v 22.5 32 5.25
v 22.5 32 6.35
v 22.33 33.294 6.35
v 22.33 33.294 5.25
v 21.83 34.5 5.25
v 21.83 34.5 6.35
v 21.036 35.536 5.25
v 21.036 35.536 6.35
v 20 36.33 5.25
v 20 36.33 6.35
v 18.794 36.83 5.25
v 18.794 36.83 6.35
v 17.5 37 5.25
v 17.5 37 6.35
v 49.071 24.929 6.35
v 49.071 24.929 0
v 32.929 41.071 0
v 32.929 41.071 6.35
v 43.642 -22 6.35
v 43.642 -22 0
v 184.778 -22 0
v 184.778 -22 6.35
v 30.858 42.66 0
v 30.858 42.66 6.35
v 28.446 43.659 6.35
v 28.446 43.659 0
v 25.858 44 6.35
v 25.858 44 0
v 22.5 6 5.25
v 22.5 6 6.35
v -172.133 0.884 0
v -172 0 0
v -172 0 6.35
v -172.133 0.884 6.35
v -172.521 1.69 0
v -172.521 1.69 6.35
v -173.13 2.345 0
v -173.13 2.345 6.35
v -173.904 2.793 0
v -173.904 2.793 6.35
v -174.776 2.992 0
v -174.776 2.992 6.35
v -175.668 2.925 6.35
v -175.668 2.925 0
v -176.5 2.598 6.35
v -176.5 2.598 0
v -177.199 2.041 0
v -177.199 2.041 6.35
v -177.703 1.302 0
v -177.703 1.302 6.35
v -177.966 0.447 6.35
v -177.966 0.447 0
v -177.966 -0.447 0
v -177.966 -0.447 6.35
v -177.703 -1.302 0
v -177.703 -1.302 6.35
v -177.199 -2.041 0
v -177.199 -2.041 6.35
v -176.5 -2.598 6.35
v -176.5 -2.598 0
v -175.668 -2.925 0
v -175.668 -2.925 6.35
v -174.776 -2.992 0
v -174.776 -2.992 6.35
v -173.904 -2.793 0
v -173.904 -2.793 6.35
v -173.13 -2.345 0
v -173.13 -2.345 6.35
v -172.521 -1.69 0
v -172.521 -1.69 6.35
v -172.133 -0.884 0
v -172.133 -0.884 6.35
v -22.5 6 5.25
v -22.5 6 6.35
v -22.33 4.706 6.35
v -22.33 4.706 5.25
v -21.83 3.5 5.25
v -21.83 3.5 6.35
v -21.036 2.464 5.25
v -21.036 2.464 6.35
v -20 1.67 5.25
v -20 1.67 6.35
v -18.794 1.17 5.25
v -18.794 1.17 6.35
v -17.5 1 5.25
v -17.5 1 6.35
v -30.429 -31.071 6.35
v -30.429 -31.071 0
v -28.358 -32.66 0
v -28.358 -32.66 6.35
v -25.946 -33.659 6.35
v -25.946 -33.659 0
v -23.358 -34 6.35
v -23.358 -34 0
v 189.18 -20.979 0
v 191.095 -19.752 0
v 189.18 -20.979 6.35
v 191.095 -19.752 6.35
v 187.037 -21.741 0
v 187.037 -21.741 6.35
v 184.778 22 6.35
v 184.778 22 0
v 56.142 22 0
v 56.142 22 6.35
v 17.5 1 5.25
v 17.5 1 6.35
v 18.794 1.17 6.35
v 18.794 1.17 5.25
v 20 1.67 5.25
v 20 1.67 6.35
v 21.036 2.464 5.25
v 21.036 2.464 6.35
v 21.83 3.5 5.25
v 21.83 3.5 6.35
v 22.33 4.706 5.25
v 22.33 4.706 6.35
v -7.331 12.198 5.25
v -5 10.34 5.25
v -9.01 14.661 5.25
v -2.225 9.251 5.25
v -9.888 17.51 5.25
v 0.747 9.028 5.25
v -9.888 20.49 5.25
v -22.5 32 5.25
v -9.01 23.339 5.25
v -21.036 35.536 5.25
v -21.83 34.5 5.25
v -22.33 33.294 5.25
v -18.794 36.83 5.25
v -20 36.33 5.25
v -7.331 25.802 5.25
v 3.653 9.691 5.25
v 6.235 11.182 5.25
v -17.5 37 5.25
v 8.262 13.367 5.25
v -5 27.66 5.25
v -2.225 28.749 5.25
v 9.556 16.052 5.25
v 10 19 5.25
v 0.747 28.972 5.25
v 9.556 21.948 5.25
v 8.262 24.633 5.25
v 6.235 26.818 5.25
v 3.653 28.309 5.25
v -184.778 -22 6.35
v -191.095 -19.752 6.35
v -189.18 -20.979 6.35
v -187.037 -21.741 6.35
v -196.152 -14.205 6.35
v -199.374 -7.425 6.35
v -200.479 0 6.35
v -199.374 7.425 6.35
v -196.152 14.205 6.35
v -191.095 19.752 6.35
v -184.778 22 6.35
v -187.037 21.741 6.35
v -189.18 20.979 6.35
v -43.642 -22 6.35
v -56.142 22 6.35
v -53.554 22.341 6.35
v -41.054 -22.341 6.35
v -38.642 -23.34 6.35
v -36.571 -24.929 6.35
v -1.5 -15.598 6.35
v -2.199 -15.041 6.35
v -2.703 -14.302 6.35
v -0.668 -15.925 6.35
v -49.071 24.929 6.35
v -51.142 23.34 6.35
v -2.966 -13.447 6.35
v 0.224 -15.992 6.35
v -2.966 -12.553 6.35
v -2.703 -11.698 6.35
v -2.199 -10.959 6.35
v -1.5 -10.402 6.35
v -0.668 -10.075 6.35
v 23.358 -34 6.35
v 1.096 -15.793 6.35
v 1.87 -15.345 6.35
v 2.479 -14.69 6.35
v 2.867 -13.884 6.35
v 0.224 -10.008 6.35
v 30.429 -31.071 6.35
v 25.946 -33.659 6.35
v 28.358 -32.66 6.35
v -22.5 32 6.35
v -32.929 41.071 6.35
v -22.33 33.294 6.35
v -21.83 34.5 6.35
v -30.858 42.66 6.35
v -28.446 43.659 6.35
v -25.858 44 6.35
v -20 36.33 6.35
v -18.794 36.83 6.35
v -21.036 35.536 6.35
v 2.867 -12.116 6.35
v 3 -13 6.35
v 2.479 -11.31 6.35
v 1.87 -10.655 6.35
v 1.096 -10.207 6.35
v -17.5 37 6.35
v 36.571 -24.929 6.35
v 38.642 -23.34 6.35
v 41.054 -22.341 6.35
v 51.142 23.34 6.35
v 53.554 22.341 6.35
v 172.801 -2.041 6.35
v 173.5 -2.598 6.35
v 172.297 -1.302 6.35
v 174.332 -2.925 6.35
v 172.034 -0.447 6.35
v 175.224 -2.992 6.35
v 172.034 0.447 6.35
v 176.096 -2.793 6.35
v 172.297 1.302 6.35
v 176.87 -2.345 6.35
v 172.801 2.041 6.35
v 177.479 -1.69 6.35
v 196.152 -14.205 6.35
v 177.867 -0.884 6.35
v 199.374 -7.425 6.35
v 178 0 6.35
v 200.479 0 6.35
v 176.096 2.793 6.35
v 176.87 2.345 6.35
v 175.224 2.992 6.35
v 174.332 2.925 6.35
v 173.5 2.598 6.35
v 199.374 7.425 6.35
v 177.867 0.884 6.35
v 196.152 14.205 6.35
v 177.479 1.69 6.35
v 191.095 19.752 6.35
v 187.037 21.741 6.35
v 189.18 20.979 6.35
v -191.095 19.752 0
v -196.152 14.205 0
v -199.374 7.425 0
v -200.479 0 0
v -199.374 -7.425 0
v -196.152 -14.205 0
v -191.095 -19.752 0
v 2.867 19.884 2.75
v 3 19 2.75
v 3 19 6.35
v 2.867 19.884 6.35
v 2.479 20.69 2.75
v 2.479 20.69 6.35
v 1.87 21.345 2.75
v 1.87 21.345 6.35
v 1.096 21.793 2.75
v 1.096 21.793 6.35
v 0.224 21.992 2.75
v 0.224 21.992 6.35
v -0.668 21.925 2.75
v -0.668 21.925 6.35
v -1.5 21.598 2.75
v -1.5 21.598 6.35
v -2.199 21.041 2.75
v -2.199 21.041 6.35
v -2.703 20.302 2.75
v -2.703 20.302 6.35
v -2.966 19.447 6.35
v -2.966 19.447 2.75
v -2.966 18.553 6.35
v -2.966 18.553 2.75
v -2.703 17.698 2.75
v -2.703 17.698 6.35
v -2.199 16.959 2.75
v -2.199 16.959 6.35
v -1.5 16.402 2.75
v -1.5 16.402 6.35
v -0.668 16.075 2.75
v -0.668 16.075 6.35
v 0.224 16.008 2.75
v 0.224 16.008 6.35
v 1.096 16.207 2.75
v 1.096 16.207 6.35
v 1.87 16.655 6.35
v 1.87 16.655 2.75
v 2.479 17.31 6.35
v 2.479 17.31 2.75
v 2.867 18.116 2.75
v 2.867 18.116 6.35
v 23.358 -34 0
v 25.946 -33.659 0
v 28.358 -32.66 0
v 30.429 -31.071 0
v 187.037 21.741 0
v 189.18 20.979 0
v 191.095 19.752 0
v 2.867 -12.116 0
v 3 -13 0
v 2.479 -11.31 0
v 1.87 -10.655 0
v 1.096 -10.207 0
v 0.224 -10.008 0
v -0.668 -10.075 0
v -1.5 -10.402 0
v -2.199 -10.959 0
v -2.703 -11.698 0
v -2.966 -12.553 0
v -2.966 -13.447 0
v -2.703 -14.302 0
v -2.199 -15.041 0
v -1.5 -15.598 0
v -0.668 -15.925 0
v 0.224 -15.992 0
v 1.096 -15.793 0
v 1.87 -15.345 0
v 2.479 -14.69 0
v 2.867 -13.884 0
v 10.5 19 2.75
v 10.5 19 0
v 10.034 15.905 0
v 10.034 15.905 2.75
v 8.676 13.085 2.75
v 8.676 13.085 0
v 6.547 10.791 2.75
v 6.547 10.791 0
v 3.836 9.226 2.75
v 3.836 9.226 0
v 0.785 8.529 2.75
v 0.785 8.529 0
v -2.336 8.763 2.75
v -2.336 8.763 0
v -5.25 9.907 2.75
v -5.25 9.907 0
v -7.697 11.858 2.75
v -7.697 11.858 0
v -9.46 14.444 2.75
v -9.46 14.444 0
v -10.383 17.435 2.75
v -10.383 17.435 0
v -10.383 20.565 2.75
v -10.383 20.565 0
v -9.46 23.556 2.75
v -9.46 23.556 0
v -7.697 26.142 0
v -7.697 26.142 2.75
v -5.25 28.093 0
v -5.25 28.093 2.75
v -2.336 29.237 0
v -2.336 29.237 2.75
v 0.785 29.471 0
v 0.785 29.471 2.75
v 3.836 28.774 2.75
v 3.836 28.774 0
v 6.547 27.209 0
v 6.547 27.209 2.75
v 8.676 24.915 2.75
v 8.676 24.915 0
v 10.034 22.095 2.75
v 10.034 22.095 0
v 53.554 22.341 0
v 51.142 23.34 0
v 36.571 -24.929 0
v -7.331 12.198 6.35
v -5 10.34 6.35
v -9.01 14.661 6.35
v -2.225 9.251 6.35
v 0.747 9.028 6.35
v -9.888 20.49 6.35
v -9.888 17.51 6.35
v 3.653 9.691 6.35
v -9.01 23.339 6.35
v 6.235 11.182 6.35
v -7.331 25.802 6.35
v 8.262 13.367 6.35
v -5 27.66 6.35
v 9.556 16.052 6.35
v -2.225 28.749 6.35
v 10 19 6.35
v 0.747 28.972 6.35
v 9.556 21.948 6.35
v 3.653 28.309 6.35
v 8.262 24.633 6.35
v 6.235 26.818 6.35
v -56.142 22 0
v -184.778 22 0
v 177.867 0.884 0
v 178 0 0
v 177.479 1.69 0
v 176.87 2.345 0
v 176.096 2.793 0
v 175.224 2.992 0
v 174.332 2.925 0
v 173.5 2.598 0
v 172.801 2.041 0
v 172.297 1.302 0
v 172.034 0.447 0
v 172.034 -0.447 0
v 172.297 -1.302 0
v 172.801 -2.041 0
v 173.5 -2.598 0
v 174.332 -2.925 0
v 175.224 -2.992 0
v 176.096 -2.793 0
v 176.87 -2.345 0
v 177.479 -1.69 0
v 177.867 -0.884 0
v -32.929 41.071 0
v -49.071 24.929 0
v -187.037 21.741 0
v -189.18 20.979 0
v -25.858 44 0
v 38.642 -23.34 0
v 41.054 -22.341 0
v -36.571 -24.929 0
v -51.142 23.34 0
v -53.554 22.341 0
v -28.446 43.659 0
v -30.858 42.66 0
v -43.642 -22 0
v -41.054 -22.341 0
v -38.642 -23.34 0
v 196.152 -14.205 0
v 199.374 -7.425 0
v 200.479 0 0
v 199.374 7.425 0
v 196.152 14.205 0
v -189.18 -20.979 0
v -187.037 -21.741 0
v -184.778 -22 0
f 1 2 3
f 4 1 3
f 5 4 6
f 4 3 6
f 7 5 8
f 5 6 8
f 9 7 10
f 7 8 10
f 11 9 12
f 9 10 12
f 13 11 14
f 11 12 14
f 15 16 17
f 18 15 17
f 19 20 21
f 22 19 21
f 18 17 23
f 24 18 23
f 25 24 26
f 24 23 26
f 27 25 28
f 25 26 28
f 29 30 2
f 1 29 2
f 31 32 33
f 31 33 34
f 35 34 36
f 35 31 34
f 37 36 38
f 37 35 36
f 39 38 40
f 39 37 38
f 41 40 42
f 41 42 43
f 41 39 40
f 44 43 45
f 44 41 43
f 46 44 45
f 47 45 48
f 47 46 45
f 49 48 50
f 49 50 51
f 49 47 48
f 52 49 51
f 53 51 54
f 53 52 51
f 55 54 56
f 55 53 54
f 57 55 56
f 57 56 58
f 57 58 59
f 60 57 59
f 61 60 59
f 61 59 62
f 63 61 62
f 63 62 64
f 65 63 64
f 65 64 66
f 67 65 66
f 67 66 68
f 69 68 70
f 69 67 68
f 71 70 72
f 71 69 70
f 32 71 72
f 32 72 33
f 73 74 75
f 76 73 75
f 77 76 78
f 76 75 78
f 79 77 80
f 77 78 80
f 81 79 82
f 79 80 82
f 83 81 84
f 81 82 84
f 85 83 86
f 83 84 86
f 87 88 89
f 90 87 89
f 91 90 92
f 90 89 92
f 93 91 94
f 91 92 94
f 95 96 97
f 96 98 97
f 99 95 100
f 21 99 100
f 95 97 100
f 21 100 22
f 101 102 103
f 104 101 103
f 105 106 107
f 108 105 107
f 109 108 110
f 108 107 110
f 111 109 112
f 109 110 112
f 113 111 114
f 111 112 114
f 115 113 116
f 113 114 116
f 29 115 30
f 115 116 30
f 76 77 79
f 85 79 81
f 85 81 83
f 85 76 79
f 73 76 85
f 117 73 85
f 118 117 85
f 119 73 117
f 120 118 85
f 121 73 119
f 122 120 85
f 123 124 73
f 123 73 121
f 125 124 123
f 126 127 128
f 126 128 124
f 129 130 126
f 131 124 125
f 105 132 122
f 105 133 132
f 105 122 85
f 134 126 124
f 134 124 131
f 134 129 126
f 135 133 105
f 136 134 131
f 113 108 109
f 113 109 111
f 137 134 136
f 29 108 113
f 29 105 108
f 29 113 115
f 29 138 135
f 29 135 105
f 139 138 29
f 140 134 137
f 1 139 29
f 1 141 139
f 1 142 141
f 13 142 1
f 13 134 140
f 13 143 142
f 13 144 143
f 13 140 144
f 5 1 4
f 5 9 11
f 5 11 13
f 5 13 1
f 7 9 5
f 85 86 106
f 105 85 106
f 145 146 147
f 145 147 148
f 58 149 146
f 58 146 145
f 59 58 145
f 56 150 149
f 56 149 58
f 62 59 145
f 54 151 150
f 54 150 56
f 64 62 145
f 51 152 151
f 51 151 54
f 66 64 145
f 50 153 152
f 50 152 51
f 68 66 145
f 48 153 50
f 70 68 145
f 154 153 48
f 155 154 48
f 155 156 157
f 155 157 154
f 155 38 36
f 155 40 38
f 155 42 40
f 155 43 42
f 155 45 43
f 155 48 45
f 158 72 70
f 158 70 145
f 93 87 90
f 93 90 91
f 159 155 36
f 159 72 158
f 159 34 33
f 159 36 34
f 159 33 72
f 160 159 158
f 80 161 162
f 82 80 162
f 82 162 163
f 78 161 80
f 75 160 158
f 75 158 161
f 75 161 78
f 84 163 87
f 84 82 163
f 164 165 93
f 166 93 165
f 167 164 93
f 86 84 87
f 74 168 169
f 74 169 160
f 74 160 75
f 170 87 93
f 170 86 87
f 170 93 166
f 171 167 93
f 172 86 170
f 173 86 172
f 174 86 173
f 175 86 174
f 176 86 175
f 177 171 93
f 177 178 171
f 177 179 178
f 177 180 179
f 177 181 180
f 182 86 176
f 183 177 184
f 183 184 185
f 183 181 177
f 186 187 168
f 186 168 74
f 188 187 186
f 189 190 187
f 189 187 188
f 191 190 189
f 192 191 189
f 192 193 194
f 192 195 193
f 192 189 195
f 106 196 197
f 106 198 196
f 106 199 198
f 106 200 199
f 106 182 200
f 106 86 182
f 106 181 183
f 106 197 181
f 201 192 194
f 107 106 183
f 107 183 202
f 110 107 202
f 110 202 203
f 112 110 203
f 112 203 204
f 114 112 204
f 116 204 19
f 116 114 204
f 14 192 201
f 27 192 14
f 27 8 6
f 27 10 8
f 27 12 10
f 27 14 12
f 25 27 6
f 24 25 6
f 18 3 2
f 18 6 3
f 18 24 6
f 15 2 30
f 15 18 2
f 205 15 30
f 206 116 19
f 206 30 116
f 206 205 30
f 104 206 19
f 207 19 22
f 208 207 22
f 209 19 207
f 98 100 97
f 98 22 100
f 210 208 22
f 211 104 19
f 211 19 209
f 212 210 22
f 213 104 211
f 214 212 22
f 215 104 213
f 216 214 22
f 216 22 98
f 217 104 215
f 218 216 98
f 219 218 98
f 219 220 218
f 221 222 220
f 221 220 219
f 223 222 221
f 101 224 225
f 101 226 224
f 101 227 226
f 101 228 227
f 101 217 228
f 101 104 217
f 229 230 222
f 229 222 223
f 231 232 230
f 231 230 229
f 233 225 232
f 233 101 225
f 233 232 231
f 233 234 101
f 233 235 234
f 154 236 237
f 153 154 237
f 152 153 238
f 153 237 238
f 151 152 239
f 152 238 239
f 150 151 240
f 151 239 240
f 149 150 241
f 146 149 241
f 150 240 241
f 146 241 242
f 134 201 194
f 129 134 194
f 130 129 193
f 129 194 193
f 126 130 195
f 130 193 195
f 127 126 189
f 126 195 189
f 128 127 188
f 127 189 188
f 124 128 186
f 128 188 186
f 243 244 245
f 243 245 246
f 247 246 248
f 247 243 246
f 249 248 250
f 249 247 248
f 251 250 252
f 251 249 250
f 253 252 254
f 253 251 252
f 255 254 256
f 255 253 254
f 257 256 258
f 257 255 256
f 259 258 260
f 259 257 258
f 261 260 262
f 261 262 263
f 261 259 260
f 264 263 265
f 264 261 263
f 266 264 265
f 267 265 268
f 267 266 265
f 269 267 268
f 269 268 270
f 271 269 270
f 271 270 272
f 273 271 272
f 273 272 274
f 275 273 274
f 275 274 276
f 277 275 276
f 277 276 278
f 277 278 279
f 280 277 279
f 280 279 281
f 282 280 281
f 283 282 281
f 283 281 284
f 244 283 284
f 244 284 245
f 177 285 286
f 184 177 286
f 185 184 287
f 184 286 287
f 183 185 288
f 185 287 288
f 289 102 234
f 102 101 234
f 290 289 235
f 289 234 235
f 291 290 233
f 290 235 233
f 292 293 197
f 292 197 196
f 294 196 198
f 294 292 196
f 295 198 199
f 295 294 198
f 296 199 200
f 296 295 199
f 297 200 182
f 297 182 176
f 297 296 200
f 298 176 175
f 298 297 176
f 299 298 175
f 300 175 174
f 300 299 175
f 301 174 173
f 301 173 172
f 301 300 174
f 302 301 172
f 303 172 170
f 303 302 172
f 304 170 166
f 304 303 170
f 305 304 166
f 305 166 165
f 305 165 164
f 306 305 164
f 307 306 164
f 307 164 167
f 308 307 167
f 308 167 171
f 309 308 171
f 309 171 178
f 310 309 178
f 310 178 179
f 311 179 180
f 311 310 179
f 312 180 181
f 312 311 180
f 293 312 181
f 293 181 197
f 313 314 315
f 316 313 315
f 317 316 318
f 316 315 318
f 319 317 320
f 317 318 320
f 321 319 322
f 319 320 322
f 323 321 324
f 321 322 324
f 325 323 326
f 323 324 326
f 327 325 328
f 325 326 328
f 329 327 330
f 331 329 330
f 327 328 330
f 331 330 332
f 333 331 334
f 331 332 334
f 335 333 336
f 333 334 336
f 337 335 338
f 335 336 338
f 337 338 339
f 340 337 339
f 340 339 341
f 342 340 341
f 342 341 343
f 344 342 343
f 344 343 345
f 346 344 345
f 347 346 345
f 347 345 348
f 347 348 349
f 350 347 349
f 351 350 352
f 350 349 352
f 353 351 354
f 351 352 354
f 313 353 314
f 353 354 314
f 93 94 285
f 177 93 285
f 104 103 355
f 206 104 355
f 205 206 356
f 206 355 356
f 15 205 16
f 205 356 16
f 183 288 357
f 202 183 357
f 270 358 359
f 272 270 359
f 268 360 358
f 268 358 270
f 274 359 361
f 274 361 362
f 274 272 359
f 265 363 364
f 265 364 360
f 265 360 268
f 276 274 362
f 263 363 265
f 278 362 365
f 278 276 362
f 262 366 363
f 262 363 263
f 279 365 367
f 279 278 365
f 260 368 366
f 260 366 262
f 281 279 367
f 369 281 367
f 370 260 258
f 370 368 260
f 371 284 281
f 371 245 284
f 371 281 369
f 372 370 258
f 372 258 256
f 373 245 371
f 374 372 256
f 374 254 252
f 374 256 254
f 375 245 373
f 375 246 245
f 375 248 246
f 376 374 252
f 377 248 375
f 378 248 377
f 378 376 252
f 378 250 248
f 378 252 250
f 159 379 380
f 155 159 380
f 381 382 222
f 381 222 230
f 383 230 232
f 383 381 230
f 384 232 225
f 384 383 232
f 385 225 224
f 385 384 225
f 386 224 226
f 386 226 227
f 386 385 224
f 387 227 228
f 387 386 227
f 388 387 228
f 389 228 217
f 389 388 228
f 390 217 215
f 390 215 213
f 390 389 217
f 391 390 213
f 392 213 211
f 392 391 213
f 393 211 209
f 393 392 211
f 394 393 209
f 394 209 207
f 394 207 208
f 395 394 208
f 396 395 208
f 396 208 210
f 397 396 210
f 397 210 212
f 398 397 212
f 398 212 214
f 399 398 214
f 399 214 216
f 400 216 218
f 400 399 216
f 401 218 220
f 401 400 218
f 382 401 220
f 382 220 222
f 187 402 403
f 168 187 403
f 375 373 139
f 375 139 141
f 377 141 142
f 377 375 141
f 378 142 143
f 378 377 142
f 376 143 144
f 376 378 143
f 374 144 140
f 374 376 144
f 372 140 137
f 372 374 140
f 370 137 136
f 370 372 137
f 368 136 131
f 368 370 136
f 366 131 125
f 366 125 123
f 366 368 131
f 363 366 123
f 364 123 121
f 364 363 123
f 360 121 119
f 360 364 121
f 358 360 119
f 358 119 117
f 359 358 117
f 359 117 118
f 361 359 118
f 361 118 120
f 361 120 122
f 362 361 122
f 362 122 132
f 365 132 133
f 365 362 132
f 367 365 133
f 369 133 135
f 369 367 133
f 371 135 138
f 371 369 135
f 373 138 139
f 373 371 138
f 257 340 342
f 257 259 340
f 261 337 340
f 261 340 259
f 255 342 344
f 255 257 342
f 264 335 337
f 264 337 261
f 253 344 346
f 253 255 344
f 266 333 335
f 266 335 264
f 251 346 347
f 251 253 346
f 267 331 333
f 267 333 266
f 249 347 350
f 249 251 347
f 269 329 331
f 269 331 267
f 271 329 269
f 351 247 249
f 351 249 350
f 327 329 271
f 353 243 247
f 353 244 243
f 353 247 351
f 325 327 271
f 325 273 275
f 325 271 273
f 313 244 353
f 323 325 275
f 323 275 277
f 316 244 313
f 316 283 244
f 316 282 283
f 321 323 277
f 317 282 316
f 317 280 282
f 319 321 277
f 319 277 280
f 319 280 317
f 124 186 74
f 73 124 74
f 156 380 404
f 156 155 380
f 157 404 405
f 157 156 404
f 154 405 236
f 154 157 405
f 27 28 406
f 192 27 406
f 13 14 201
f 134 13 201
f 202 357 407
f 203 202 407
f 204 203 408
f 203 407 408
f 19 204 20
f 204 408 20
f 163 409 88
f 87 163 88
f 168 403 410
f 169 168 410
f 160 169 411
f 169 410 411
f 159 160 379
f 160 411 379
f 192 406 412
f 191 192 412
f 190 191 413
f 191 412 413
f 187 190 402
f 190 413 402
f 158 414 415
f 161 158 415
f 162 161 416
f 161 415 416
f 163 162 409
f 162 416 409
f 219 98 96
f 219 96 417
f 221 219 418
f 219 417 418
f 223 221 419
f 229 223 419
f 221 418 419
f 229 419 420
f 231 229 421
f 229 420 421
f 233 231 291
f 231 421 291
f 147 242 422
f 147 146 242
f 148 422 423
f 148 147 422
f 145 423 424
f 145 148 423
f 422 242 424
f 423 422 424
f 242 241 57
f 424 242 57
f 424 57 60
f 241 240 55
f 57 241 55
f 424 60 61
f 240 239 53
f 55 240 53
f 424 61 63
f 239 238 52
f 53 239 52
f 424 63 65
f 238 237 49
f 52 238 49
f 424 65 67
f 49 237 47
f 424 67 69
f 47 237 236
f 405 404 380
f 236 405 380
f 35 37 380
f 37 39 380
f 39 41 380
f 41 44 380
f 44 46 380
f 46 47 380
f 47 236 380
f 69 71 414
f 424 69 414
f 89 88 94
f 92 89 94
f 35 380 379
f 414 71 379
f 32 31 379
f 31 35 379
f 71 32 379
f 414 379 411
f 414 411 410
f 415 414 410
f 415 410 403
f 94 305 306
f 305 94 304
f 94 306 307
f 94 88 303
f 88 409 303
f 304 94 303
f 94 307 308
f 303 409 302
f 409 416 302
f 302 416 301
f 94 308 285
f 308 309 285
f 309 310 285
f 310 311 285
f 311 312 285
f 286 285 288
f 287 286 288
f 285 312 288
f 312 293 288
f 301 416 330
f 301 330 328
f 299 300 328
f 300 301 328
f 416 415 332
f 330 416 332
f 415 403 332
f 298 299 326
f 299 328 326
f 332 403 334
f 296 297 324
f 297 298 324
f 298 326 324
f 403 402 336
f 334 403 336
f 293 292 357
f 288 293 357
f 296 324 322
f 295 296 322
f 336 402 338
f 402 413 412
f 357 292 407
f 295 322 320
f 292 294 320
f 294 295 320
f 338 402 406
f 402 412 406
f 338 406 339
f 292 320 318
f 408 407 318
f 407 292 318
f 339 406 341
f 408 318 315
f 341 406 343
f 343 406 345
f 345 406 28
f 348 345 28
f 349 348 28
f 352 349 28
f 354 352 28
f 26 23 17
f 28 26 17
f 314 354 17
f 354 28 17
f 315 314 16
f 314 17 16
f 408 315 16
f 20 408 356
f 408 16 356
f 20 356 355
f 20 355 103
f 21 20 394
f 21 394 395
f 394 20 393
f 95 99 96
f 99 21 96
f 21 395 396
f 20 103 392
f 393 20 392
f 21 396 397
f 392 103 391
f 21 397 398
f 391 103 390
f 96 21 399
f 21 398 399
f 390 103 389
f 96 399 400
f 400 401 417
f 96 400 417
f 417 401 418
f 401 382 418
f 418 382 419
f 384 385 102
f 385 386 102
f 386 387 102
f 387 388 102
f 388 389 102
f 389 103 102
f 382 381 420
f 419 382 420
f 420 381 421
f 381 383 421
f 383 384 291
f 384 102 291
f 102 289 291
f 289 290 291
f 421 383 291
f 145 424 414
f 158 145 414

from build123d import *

# Parameters (mm, degrees)
F0_R     = 3
F1_DEPTH = 6.35
F2_R     = 10
F3_R     = 10.5
F4_DEPTH = 2.75
F5_R     = 10
F6_DEPTH = 1.1


# Not quite as in the source:
# - a feature names something its author has since deleted; it is built from what else it names


with BuildPart() as f1:
    # F0 (on Top) → F1 (new body)
    with BuildSketch(Plane.XY):
        with BuildLine():
            Line((25.8578643763, 44), (0, 44))
            Line((0, 44), (-25.8578643763, 44))
            ThreePointArc((-25.8578643763, 44), (-29.6846986999, 43.2387953251), (-32.9289321881, 41.0710678119))
            Line((-32.9289321881, 41.0710678119), (-49.0710678119, 24.9289321881))
            ThreePointArc((-49.0710678119, 24.9289321881), (-52.3153013001, 22.7612046749), (-56.1421356237, 22))
            Line((-56.1421356237, 22), (-187.8528743982, 22))
            ThreePointArc((-187.8528743982, 22), (-200.4793324147, 0), (-187.8528743982, -22))
            Line((-187.8528743982, -22), (-43.6421356237, -22))
            ThreePointArc((-43.6421356237, -22), (-39.8153013001, -22.7612046749), (-36.5710678119, -24.9289321881))
            Line((-36.5710678119, -24.9289321881), (-30.4289321881, -31.0710678119))
            ThreePointArc((-30.4289321881, -31.0710678119), (-27.1846986999, -33.2387953251), (-23.3578643763, -34))
            Line((-23.3578643763, -34), (0, -34))
            Line((0, -34), (23.3578643763, -34))
            ThreePointArc((23.3578643763, -34), (27.1846986999, -33.2387953251), (30.4289321881, -31.0710678119))
            Line((30.4289321881, -31.0710678119), (36.5710678119, -24.9289321881))
            ThreePointArc((36.5710678119, -24.9289321881), (39.8153013001, -22.7612046749), (43.6421356237, -22))
            Line((43.6421356237, -22), (187.8528743982, -22))
            ThreePointArc((187.8528743982, -22), (200.4793324147, 0), (187.8528743982, 22))
            Line((187.8528743982, 22), (56.1421356237, 22))
            ThreePointArc((56.1421356237, 22), (52.3153013001, 22.7612046749), (49.0710678119, 24.9289321881))
            Line((49.0710678119, 24.9289321881), (32.9289321881, 41.0710678119))
            ThreePointArc((32.9289321881, 41.0710678119), (29.6846986999, 43.2387953251), (25.8578643763, 44))
        make_face()
        with Locations((-175, 0)):
            Circle(F0_R, mode=Mode.SUBTRACT)
        with Locations((0, -13)):
            Circle(F0_R, mode=Mode.SUBTRACT)
        with Locations((175, 0)):
            Circle(F0_R, mode=Mode.SUBTRACT)
        with Locations((0, 19)):
            Circle(F0_R, mode=Mode.SUBTRACT)
    extrude(amount=F1_DEPTH)

    # F2
    f2_edges = [f1.edges().sort_by_distance(p)[0] for p in [
        (-187.852874, 22, 3.175),
        (-187.852874, -22, 3.175),
        (187.852874, -22, 3.175),
        (187.852874, 22, 3.175),
    ]]
    fillet(f2_edges, radius=F2_R)

    # F3 (on face) → F4 (cut)
    with BuildSketch(Plane(origin=(0, 0, 0), x_dir=(1, 0, 0), z_dir=(0, 0, -1))):
        with Locations((0, -19)):
            Circle(F3_R)
    extrude(amount=-F4_DEPTH, mode=Mode.SUBTRACT)

    # F5 (on face) → F6 (cut)
    with BuildSketch(Plane.XY.offset(6.35)):
        with BuildLine():
            ThreePointArc((22.5, 32), (21.0355339059, 35.5355339059), (17.5, 37))
            Line((17.5, 37), (-17.5, 37))
            ThreePointArc((-17.5, 37), (-21.0355339059, 35.5355339059), (-22.5, 32))
            Line((-22.5, 32), (-22.5, 6))
            ThreePointArc((-22.5, 6), (-21.0355339059, 2.4644660941), (-17.5, 1))
            Line((-17.5, 1), (17.5, 1))
            ThreePointArc((17.5, 1), (21.0355339059, 2.4644660941), (22.5, 6))
            Line((22.5, 6), (22.5, 32))
        make_face()
        with Locations((0, 19)):
            Circle(F5_R, mode=Mode.SUBTRACT)
    extrude(amount=-F6_DEPTH, mode=Mode.SUBTRACT)


solid = f1.part
